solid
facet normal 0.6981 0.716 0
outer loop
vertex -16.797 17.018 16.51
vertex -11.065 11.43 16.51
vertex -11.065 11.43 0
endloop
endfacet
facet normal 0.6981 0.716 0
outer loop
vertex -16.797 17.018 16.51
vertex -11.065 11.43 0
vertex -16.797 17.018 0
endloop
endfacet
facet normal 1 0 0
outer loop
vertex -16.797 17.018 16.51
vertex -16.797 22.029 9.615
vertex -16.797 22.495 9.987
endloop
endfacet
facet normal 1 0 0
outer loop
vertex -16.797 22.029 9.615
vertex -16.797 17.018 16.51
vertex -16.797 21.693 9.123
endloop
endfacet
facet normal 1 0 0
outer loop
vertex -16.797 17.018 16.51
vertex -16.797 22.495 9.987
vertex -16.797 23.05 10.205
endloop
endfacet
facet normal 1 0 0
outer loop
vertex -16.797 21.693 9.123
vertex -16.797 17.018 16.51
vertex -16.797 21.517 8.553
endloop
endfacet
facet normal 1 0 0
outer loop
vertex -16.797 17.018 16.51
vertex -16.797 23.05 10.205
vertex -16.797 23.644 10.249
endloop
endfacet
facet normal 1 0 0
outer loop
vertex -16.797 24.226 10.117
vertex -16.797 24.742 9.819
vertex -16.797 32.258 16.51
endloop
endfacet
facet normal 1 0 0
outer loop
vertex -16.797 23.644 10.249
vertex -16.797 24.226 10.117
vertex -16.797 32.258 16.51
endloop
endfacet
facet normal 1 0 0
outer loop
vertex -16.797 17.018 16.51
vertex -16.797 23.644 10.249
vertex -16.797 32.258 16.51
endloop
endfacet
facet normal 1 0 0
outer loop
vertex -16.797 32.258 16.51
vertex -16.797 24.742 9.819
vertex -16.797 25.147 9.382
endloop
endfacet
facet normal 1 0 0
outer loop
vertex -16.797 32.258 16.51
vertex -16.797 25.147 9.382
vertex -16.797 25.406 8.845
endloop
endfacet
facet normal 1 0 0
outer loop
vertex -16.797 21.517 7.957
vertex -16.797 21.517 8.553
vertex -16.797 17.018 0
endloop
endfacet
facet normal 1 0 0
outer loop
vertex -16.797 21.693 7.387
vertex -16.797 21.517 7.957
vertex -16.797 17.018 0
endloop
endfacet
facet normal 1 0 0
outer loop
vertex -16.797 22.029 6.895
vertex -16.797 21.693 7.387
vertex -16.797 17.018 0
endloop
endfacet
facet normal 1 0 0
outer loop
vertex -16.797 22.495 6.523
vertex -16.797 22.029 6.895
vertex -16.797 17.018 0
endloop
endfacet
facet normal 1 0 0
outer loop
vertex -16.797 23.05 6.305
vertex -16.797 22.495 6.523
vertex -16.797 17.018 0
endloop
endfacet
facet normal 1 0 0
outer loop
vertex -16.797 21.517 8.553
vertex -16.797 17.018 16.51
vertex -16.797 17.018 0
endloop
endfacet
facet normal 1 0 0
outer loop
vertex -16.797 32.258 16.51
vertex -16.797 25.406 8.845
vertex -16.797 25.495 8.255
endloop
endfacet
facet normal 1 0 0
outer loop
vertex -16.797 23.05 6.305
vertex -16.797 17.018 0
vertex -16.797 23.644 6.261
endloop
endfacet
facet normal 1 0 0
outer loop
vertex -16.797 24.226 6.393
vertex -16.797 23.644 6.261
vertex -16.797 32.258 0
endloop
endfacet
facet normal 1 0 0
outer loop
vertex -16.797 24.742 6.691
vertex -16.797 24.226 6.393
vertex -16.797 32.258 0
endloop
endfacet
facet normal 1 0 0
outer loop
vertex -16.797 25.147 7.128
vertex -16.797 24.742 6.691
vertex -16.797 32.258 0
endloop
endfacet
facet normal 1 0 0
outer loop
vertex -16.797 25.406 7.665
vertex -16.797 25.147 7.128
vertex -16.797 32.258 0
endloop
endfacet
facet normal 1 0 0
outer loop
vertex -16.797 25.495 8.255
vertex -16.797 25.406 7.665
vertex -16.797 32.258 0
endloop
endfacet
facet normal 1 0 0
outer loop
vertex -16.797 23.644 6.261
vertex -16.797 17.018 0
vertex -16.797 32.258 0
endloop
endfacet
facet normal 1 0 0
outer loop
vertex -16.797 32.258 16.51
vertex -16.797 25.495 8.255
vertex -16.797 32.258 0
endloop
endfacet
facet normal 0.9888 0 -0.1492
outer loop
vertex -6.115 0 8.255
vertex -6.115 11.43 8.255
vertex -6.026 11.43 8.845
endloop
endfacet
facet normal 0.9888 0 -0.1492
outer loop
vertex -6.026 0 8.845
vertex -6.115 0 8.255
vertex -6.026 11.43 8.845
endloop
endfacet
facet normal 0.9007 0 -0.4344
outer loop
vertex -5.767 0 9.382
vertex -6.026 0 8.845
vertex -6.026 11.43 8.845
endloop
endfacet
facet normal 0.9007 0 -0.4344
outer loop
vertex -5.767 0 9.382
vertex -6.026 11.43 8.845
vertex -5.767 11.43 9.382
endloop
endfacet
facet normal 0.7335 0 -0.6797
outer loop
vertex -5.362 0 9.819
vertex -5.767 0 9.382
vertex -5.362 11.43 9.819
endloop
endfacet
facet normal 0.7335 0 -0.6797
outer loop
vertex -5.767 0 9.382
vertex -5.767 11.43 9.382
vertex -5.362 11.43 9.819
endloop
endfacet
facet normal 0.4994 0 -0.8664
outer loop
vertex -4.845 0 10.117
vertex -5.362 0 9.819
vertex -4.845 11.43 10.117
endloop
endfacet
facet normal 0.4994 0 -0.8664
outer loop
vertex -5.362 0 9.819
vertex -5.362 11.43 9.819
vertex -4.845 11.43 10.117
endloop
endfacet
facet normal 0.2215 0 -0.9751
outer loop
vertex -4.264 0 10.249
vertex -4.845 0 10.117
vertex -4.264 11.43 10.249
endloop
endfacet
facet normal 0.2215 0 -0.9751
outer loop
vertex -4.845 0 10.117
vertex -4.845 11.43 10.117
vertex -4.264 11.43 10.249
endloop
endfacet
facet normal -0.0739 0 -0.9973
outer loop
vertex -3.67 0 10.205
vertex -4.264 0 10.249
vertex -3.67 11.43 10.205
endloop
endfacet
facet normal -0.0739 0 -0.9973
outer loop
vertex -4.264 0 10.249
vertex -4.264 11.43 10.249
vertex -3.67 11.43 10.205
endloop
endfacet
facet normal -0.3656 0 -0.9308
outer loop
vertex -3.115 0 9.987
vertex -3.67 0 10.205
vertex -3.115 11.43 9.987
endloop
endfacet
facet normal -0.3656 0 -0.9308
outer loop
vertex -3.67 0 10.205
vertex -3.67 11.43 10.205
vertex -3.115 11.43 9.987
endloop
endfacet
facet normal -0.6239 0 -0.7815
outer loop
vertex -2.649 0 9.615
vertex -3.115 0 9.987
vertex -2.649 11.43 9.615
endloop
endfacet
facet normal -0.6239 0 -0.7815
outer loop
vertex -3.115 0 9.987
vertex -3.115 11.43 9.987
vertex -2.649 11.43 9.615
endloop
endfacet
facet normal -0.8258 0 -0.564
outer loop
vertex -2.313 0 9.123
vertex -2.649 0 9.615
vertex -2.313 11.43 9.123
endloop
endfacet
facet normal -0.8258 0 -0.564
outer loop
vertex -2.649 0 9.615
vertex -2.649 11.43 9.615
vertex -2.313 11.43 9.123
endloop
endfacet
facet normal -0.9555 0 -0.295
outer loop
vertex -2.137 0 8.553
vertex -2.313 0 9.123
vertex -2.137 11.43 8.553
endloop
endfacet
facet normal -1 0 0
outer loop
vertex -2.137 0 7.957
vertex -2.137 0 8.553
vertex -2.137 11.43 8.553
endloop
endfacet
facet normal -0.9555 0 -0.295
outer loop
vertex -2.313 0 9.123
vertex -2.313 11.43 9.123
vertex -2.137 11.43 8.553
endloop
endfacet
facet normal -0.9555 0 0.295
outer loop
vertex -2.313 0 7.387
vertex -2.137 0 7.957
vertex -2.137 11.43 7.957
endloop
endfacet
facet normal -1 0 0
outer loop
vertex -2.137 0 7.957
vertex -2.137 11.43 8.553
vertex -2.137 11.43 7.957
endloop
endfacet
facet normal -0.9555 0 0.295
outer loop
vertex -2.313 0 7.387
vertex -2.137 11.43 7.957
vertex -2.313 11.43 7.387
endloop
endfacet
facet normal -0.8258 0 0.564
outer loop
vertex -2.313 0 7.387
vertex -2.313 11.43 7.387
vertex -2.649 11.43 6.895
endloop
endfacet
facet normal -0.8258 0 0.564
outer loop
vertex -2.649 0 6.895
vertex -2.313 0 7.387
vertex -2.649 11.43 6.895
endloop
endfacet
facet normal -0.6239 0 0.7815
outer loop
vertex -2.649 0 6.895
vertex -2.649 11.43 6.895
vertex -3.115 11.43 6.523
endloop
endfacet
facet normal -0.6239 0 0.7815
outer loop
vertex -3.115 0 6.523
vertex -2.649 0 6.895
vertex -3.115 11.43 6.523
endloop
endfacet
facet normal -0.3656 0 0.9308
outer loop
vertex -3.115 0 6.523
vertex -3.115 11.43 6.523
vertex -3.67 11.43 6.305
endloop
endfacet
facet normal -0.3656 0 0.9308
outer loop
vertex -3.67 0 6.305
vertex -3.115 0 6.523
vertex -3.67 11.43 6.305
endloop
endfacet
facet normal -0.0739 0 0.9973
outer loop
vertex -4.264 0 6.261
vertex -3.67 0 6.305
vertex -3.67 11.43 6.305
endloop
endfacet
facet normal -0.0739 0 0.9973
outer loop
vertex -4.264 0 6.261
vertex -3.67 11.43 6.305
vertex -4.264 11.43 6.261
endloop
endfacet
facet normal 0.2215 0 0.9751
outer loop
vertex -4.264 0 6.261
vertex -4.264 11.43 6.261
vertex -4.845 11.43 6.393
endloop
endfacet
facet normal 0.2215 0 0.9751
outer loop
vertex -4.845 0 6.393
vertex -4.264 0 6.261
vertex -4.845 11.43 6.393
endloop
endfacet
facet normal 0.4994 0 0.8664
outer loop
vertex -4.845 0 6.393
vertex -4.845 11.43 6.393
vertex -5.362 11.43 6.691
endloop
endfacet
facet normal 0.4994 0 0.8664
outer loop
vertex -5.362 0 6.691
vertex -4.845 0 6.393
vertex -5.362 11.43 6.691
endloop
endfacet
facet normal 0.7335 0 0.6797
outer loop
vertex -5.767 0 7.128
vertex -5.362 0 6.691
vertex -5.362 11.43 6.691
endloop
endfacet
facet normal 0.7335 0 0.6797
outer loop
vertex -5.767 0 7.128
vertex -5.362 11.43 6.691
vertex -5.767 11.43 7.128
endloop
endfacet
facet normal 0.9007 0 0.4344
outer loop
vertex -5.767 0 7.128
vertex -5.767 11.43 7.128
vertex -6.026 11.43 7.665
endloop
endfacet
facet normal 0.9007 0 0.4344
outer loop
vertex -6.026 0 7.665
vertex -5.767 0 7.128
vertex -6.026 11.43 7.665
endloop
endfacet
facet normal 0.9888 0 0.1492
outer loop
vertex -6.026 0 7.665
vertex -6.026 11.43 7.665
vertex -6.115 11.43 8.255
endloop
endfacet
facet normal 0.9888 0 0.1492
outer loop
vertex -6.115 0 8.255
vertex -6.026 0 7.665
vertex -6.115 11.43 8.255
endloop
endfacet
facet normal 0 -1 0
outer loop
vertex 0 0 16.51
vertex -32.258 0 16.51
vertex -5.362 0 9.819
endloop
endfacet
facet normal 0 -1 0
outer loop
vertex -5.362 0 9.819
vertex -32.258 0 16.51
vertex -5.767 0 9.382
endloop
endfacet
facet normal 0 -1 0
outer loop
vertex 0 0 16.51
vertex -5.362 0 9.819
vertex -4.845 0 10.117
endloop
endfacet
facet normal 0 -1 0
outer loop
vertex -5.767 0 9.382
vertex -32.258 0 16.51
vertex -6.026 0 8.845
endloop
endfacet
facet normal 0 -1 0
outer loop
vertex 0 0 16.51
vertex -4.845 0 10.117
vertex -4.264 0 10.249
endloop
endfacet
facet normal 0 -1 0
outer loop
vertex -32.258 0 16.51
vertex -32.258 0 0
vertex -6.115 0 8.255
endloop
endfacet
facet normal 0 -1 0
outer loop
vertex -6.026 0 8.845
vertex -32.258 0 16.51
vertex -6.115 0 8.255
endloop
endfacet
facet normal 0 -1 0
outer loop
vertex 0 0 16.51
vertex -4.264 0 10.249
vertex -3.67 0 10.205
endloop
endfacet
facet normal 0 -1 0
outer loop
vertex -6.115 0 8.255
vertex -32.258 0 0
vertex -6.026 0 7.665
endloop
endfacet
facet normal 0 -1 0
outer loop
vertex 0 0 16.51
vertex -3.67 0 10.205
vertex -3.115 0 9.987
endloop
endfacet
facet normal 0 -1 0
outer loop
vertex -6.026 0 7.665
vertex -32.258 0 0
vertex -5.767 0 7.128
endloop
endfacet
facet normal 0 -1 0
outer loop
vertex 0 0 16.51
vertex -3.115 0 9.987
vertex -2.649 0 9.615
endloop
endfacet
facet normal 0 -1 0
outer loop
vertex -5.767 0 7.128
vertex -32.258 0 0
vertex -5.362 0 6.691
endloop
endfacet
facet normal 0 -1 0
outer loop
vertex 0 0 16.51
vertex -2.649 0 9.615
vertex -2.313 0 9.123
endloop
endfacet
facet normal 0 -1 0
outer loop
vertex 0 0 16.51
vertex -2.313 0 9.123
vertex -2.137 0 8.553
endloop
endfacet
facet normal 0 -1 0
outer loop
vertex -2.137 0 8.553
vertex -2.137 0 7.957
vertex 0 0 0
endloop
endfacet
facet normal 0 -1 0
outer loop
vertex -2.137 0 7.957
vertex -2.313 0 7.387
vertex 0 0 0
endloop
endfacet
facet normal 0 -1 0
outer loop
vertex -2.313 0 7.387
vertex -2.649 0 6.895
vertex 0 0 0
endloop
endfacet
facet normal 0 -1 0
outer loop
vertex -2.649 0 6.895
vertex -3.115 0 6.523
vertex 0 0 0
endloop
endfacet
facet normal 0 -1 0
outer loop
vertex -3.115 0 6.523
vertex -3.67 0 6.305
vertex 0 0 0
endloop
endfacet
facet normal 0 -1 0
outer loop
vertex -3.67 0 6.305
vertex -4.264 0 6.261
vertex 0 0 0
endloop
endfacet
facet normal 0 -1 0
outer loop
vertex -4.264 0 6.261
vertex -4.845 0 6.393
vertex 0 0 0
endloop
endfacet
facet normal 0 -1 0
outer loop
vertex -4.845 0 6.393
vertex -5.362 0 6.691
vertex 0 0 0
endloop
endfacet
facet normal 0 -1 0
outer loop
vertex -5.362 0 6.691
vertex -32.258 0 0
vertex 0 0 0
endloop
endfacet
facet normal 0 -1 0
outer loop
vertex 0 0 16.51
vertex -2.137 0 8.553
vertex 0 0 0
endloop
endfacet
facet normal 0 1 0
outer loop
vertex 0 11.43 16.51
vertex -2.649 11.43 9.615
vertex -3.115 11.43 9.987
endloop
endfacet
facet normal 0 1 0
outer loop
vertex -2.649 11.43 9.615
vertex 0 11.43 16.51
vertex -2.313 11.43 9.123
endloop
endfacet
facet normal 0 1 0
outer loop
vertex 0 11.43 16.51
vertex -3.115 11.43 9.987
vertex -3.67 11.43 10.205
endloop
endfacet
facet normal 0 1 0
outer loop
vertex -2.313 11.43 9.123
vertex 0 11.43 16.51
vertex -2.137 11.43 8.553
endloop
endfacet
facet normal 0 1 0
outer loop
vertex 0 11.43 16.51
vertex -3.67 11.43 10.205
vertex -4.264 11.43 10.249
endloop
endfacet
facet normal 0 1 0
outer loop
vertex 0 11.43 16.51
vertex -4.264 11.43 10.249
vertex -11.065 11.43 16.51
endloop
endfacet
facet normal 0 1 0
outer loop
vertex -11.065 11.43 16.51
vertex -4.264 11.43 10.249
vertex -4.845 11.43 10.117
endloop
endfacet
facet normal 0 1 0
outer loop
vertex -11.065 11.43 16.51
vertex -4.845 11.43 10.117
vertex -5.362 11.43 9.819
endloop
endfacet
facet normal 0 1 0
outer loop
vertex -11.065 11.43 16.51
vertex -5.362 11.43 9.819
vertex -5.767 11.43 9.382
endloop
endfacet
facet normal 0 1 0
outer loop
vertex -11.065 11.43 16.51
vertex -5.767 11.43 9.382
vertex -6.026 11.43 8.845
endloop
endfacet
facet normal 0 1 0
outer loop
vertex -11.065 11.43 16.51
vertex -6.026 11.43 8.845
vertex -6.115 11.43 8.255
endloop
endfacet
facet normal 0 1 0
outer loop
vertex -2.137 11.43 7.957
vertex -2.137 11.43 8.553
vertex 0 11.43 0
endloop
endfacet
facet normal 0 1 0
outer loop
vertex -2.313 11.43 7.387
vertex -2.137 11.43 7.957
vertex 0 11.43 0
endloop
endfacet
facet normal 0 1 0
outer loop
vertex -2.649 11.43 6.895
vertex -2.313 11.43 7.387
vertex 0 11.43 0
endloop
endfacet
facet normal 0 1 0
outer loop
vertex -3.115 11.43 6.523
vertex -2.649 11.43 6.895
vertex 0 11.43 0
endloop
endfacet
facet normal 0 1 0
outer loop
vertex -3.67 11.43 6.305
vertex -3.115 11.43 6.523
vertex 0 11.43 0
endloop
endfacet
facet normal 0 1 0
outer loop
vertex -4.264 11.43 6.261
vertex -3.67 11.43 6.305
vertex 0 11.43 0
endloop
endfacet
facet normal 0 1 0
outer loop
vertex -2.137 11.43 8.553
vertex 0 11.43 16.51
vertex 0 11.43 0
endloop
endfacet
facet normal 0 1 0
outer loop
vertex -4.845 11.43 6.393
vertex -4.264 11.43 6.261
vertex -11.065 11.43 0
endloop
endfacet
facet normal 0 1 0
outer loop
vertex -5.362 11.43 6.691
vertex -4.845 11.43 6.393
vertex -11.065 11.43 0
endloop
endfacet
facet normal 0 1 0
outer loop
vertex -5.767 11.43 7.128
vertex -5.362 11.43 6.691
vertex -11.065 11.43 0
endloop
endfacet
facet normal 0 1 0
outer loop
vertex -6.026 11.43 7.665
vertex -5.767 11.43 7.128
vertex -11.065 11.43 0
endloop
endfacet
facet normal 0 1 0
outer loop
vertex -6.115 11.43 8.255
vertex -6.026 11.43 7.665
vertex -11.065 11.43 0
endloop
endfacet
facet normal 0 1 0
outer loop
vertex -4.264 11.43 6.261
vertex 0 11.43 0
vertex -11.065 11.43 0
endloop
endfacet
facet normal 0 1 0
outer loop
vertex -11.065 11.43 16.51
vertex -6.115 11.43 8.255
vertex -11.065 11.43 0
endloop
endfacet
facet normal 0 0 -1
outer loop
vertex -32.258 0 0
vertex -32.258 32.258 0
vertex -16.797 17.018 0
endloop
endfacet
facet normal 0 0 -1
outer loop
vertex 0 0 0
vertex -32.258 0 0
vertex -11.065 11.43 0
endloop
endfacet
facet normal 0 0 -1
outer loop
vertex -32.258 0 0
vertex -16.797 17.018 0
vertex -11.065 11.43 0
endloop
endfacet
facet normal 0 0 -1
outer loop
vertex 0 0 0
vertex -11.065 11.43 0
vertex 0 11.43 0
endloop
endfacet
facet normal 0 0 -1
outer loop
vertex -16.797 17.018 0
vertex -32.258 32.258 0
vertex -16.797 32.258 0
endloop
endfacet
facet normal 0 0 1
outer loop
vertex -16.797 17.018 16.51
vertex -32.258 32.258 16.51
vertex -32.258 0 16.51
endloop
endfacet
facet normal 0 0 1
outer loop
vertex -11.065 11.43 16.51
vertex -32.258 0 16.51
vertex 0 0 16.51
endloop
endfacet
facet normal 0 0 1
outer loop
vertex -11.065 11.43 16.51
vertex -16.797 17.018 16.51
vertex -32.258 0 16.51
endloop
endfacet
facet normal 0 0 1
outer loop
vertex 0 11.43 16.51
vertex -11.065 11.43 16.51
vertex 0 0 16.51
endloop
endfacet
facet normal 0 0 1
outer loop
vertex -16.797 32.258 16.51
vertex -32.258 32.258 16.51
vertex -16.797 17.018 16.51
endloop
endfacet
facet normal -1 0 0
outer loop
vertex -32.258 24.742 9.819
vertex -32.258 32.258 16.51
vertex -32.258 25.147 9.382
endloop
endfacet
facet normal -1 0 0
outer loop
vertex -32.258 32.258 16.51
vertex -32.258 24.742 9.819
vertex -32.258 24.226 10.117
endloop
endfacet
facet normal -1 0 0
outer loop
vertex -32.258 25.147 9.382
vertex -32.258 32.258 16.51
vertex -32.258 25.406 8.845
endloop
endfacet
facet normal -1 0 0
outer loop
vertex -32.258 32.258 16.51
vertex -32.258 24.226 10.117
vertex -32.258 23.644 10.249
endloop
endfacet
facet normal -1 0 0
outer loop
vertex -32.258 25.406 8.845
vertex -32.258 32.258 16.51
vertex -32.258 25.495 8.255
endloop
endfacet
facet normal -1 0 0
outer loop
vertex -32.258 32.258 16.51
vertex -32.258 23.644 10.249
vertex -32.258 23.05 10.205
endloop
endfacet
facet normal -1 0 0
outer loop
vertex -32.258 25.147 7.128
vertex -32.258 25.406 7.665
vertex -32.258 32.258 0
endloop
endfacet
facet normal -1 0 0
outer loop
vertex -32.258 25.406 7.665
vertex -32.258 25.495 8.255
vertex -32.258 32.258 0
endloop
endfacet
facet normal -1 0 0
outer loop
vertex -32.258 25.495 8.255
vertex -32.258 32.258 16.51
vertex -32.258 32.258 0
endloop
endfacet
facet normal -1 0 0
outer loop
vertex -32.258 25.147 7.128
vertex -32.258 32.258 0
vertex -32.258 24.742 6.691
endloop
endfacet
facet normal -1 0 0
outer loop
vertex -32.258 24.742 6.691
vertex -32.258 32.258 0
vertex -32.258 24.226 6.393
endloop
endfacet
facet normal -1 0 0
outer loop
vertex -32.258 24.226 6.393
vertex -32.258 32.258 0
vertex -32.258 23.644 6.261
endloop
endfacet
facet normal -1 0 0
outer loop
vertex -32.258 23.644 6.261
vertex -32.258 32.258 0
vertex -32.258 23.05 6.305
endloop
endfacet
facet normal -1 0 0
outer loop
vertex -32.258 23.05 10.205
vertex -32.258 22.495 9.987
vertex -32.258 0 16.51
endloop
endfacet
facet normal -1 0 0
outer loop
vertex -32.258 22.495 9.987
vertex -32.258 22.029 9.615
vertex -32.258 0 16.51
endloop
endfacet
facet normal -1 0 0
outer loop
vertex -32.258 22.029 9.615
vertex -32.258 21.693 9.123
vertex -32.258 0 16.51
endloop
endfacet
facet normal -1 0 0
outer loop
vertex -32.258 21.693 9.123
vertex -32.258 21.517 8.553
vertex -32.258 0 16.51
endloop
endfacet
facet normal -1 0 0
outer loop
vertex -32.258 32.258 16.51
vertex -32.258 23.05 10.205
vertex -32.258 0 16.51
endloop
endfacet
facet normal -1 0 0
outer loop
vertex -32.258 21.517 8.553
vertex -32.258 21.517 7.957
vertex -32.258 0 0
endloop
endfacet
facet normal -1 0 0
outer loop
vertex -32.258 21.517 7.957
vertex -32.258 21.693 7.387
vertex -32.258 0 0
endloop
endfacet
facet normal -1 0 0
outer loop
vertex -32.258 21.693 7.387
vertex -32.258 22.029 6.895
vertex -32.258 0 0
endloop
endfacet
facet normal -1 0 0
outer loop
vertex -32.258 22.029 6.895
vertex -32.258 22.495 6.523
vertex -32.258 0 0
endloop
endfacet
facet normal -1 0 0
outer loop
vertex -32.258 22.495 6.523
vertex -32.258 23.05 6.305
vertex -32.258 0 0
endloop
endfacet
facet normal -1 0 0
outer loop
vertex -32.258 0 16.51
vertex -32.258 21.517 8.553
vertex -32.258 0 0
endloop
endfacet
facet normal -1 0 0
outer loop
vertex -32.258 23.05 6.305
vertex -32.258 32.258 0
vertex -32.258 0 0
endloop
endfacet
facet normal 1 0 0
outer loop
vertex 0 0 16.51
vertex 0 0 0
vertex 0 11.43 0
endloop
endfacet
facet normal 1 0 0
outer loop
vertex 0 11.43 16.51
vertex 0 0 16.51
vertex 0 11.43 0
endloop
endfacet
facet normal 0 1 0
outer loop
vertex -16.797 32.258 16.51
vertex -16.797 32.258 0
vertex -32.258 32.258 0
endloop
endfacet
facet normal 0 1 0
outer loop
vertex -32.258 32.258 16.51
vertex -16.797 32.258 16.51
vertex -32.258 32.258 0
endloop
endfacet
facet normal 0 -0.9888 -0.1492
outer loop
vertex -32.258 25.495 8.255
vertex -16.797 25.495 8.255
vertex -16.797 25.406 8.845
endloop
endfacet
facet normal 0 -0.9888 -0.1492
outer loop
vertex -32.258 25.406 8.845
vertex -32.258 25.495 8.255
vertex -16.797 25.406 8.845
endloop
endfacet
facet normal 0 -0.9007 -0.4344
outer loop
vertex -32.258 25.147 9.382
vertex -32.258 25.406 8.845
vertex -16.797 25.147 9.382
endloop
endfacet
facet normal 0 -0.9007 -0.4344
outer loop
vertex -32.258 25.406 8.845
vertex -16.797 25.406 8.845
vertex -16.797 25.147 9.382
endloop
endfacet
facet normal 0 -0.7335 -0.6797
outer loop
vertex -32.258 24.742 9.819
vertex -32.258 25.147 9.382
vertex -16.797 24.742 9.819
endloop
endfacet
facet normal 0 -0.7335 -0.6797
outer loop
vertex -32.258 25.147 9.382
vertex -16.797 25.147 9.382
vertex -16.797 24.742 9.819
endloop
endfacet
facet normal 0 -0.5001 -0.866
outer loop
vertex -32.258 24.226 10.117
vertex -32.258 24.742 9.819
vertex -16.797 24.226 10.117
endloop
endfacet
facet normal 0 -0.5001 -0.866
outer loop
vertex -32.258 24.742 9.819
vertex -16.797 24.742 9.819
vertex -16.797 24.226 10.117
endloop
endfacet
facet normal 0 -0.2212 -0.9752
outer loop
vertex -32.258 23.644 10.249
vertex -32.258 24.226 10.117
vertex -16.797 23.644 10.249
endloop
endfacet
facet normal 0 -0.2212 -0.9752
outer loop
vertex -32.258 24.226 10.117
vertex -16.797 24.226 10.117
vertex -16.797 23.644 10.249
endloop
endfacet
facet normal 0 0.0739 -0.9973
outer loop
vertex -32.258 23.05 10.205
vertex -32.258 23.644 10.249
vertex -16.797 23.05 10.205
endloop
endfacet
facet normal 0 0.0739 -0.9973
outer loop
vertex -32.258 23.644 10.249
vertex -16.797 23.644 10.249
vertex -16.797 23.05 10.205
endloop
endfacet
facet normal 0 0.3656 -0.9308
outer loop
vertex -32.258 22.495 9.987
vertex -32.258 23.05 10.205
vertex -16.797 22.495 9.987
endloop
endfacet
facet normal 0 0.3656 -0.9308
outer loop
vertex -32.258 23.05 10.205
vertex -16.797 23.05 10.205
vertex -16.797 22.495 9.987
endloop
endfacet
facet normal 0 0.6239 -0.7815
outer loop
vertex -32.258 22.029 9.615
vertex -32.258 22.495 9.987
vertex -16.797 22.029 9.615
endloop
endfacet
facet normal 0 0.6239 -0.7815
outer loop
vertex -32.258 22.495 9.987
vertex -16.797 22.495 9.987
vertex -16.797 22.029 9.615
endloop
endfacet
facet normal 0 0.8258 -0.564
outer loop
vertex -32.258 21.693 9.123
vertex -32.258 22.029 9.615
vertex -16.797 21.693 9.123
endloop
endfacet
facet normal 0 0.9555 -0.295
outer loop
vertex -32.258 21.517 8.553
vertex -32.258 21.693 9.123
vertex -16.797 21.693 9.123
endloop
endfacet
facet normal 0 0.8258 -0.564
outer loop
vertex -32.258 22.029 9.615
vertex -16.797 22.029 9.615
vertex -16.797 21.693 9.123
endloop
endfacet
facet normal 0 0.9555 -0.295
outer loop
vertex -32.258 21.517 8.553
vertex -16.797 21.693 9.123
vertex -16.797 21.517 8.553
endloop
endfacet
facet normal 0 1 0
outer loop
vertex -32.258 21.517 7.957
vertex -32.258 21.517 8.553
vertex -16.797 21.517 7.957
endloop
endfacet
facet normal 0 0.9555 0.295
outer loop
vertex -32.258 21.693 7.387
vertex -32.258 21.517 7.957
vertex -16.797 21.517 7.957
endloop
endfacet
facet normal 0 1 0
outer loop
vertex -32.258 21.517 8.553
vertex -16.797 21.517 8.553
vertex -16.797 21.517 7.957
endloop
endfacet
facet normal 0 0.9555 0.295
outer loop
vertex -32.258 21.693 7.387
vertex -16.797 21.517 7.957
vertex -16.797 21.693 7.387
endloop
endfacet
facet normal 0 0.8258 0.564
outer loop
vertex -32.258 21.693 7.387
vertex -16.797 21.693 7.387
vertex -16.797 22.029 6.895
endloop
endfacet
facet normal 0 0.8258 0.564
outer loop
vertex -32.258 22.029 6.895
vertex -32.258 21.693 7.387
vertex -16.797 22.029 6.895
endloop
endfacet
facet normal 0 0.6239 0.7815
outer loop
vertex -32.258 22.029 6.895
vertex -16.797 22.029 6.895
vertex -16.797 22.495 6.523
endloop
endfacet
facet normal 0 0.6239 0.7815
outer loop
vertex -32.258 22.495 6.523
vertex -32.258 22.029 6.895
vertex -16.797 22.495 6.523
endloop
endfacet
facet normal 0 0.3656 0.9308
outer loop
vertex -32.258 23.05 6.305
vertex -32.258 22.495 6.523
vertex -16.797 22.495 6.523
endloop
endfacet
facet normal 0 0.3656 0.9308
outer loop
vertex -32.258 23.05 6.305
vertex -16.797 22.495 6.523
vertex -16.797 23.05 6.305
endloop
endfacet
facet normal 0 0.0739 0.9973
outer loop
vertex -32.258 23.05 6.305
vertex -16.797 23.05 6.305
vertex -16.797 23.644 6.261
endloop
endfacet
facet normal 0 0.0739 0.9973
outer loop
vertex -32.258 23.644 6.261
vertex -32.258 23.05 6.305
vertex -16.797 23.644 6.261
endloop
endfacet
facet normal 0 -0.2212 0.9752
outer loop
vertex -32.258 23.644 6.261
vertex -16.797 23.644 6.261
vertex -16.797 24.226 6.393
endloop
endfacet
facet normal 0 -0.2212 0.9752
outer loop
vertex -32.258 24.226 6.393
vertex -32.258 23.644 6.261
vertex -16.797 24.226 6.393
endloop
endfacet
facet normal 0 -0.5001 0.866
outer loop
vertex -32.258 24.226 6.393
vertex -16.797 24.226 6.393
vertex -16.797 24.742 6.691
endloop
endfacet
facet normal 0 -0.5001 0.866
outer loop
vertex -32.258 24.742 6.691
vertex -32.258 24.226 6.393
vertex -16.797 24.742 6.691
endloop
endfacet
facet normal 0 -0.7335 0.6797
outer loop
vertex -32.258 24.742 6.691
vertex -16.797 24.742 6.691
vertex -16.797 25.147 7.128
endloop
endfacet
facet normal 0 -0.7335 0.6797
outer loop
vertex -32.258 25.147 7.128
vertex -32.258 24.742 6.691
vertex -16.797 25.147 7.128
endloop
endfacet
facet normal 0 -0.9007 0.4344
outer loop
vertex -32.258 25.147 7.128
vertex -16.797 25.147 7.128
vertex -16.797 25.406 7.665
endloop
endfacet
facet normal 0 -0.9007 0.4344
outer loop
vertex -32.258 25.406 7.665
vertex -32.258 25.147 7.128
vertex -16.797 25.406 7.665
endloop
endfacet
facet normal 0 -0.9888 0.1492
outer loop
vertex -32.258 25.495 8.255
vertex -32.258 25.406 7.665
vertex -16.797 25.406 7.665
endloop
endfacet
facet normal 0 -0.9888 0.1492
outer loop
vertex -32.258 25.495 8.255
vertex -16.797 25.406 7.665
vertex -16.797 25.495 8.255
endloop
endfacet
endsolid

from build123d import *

# Parameters (mm, degrees)
F0_W     = 11.43
F0_H     = 15.24
F0_W_2   = 4.0305707882
F1_DEPTH = 16.51
F3_D     = 4
F5_D     = 4


with BuildPart() as f1:
    # F0 (on Top) → F1 (new body)
    with BuildSketch(Plane.XY):
        Polygon((-32.258, 0), (0, 0), (0, 11.43), (-11.0645864088, 11.43), (-16.7974292118, 17.018), (-20.828, 17.018), (-32.258, 17.018), align=None)
        with Locations((-26.543, 24.638)):
            Rectangle(F0_W, F0_H)
        with Locations((-18.8127146059, 24.638)):
            Rectangle(F0_W_2, F0_H)
    extrude(amount=F1_DEPTH)

    # F3 (through all)
    with Locations(Plane.XZ):
        with Locations((-4.1148, 8.255)):
            Hole(F3_D / 2)

    # F5 (through all)
    with Locations(Plane(origin=(-32.258, 0, 0), x_dir=(0, -1, 0), z_dir=(-1, 0, 0))):
        with Locations((-23.495, 8.255)):
            Hole(F5_D / 2)


solid = f1.part
